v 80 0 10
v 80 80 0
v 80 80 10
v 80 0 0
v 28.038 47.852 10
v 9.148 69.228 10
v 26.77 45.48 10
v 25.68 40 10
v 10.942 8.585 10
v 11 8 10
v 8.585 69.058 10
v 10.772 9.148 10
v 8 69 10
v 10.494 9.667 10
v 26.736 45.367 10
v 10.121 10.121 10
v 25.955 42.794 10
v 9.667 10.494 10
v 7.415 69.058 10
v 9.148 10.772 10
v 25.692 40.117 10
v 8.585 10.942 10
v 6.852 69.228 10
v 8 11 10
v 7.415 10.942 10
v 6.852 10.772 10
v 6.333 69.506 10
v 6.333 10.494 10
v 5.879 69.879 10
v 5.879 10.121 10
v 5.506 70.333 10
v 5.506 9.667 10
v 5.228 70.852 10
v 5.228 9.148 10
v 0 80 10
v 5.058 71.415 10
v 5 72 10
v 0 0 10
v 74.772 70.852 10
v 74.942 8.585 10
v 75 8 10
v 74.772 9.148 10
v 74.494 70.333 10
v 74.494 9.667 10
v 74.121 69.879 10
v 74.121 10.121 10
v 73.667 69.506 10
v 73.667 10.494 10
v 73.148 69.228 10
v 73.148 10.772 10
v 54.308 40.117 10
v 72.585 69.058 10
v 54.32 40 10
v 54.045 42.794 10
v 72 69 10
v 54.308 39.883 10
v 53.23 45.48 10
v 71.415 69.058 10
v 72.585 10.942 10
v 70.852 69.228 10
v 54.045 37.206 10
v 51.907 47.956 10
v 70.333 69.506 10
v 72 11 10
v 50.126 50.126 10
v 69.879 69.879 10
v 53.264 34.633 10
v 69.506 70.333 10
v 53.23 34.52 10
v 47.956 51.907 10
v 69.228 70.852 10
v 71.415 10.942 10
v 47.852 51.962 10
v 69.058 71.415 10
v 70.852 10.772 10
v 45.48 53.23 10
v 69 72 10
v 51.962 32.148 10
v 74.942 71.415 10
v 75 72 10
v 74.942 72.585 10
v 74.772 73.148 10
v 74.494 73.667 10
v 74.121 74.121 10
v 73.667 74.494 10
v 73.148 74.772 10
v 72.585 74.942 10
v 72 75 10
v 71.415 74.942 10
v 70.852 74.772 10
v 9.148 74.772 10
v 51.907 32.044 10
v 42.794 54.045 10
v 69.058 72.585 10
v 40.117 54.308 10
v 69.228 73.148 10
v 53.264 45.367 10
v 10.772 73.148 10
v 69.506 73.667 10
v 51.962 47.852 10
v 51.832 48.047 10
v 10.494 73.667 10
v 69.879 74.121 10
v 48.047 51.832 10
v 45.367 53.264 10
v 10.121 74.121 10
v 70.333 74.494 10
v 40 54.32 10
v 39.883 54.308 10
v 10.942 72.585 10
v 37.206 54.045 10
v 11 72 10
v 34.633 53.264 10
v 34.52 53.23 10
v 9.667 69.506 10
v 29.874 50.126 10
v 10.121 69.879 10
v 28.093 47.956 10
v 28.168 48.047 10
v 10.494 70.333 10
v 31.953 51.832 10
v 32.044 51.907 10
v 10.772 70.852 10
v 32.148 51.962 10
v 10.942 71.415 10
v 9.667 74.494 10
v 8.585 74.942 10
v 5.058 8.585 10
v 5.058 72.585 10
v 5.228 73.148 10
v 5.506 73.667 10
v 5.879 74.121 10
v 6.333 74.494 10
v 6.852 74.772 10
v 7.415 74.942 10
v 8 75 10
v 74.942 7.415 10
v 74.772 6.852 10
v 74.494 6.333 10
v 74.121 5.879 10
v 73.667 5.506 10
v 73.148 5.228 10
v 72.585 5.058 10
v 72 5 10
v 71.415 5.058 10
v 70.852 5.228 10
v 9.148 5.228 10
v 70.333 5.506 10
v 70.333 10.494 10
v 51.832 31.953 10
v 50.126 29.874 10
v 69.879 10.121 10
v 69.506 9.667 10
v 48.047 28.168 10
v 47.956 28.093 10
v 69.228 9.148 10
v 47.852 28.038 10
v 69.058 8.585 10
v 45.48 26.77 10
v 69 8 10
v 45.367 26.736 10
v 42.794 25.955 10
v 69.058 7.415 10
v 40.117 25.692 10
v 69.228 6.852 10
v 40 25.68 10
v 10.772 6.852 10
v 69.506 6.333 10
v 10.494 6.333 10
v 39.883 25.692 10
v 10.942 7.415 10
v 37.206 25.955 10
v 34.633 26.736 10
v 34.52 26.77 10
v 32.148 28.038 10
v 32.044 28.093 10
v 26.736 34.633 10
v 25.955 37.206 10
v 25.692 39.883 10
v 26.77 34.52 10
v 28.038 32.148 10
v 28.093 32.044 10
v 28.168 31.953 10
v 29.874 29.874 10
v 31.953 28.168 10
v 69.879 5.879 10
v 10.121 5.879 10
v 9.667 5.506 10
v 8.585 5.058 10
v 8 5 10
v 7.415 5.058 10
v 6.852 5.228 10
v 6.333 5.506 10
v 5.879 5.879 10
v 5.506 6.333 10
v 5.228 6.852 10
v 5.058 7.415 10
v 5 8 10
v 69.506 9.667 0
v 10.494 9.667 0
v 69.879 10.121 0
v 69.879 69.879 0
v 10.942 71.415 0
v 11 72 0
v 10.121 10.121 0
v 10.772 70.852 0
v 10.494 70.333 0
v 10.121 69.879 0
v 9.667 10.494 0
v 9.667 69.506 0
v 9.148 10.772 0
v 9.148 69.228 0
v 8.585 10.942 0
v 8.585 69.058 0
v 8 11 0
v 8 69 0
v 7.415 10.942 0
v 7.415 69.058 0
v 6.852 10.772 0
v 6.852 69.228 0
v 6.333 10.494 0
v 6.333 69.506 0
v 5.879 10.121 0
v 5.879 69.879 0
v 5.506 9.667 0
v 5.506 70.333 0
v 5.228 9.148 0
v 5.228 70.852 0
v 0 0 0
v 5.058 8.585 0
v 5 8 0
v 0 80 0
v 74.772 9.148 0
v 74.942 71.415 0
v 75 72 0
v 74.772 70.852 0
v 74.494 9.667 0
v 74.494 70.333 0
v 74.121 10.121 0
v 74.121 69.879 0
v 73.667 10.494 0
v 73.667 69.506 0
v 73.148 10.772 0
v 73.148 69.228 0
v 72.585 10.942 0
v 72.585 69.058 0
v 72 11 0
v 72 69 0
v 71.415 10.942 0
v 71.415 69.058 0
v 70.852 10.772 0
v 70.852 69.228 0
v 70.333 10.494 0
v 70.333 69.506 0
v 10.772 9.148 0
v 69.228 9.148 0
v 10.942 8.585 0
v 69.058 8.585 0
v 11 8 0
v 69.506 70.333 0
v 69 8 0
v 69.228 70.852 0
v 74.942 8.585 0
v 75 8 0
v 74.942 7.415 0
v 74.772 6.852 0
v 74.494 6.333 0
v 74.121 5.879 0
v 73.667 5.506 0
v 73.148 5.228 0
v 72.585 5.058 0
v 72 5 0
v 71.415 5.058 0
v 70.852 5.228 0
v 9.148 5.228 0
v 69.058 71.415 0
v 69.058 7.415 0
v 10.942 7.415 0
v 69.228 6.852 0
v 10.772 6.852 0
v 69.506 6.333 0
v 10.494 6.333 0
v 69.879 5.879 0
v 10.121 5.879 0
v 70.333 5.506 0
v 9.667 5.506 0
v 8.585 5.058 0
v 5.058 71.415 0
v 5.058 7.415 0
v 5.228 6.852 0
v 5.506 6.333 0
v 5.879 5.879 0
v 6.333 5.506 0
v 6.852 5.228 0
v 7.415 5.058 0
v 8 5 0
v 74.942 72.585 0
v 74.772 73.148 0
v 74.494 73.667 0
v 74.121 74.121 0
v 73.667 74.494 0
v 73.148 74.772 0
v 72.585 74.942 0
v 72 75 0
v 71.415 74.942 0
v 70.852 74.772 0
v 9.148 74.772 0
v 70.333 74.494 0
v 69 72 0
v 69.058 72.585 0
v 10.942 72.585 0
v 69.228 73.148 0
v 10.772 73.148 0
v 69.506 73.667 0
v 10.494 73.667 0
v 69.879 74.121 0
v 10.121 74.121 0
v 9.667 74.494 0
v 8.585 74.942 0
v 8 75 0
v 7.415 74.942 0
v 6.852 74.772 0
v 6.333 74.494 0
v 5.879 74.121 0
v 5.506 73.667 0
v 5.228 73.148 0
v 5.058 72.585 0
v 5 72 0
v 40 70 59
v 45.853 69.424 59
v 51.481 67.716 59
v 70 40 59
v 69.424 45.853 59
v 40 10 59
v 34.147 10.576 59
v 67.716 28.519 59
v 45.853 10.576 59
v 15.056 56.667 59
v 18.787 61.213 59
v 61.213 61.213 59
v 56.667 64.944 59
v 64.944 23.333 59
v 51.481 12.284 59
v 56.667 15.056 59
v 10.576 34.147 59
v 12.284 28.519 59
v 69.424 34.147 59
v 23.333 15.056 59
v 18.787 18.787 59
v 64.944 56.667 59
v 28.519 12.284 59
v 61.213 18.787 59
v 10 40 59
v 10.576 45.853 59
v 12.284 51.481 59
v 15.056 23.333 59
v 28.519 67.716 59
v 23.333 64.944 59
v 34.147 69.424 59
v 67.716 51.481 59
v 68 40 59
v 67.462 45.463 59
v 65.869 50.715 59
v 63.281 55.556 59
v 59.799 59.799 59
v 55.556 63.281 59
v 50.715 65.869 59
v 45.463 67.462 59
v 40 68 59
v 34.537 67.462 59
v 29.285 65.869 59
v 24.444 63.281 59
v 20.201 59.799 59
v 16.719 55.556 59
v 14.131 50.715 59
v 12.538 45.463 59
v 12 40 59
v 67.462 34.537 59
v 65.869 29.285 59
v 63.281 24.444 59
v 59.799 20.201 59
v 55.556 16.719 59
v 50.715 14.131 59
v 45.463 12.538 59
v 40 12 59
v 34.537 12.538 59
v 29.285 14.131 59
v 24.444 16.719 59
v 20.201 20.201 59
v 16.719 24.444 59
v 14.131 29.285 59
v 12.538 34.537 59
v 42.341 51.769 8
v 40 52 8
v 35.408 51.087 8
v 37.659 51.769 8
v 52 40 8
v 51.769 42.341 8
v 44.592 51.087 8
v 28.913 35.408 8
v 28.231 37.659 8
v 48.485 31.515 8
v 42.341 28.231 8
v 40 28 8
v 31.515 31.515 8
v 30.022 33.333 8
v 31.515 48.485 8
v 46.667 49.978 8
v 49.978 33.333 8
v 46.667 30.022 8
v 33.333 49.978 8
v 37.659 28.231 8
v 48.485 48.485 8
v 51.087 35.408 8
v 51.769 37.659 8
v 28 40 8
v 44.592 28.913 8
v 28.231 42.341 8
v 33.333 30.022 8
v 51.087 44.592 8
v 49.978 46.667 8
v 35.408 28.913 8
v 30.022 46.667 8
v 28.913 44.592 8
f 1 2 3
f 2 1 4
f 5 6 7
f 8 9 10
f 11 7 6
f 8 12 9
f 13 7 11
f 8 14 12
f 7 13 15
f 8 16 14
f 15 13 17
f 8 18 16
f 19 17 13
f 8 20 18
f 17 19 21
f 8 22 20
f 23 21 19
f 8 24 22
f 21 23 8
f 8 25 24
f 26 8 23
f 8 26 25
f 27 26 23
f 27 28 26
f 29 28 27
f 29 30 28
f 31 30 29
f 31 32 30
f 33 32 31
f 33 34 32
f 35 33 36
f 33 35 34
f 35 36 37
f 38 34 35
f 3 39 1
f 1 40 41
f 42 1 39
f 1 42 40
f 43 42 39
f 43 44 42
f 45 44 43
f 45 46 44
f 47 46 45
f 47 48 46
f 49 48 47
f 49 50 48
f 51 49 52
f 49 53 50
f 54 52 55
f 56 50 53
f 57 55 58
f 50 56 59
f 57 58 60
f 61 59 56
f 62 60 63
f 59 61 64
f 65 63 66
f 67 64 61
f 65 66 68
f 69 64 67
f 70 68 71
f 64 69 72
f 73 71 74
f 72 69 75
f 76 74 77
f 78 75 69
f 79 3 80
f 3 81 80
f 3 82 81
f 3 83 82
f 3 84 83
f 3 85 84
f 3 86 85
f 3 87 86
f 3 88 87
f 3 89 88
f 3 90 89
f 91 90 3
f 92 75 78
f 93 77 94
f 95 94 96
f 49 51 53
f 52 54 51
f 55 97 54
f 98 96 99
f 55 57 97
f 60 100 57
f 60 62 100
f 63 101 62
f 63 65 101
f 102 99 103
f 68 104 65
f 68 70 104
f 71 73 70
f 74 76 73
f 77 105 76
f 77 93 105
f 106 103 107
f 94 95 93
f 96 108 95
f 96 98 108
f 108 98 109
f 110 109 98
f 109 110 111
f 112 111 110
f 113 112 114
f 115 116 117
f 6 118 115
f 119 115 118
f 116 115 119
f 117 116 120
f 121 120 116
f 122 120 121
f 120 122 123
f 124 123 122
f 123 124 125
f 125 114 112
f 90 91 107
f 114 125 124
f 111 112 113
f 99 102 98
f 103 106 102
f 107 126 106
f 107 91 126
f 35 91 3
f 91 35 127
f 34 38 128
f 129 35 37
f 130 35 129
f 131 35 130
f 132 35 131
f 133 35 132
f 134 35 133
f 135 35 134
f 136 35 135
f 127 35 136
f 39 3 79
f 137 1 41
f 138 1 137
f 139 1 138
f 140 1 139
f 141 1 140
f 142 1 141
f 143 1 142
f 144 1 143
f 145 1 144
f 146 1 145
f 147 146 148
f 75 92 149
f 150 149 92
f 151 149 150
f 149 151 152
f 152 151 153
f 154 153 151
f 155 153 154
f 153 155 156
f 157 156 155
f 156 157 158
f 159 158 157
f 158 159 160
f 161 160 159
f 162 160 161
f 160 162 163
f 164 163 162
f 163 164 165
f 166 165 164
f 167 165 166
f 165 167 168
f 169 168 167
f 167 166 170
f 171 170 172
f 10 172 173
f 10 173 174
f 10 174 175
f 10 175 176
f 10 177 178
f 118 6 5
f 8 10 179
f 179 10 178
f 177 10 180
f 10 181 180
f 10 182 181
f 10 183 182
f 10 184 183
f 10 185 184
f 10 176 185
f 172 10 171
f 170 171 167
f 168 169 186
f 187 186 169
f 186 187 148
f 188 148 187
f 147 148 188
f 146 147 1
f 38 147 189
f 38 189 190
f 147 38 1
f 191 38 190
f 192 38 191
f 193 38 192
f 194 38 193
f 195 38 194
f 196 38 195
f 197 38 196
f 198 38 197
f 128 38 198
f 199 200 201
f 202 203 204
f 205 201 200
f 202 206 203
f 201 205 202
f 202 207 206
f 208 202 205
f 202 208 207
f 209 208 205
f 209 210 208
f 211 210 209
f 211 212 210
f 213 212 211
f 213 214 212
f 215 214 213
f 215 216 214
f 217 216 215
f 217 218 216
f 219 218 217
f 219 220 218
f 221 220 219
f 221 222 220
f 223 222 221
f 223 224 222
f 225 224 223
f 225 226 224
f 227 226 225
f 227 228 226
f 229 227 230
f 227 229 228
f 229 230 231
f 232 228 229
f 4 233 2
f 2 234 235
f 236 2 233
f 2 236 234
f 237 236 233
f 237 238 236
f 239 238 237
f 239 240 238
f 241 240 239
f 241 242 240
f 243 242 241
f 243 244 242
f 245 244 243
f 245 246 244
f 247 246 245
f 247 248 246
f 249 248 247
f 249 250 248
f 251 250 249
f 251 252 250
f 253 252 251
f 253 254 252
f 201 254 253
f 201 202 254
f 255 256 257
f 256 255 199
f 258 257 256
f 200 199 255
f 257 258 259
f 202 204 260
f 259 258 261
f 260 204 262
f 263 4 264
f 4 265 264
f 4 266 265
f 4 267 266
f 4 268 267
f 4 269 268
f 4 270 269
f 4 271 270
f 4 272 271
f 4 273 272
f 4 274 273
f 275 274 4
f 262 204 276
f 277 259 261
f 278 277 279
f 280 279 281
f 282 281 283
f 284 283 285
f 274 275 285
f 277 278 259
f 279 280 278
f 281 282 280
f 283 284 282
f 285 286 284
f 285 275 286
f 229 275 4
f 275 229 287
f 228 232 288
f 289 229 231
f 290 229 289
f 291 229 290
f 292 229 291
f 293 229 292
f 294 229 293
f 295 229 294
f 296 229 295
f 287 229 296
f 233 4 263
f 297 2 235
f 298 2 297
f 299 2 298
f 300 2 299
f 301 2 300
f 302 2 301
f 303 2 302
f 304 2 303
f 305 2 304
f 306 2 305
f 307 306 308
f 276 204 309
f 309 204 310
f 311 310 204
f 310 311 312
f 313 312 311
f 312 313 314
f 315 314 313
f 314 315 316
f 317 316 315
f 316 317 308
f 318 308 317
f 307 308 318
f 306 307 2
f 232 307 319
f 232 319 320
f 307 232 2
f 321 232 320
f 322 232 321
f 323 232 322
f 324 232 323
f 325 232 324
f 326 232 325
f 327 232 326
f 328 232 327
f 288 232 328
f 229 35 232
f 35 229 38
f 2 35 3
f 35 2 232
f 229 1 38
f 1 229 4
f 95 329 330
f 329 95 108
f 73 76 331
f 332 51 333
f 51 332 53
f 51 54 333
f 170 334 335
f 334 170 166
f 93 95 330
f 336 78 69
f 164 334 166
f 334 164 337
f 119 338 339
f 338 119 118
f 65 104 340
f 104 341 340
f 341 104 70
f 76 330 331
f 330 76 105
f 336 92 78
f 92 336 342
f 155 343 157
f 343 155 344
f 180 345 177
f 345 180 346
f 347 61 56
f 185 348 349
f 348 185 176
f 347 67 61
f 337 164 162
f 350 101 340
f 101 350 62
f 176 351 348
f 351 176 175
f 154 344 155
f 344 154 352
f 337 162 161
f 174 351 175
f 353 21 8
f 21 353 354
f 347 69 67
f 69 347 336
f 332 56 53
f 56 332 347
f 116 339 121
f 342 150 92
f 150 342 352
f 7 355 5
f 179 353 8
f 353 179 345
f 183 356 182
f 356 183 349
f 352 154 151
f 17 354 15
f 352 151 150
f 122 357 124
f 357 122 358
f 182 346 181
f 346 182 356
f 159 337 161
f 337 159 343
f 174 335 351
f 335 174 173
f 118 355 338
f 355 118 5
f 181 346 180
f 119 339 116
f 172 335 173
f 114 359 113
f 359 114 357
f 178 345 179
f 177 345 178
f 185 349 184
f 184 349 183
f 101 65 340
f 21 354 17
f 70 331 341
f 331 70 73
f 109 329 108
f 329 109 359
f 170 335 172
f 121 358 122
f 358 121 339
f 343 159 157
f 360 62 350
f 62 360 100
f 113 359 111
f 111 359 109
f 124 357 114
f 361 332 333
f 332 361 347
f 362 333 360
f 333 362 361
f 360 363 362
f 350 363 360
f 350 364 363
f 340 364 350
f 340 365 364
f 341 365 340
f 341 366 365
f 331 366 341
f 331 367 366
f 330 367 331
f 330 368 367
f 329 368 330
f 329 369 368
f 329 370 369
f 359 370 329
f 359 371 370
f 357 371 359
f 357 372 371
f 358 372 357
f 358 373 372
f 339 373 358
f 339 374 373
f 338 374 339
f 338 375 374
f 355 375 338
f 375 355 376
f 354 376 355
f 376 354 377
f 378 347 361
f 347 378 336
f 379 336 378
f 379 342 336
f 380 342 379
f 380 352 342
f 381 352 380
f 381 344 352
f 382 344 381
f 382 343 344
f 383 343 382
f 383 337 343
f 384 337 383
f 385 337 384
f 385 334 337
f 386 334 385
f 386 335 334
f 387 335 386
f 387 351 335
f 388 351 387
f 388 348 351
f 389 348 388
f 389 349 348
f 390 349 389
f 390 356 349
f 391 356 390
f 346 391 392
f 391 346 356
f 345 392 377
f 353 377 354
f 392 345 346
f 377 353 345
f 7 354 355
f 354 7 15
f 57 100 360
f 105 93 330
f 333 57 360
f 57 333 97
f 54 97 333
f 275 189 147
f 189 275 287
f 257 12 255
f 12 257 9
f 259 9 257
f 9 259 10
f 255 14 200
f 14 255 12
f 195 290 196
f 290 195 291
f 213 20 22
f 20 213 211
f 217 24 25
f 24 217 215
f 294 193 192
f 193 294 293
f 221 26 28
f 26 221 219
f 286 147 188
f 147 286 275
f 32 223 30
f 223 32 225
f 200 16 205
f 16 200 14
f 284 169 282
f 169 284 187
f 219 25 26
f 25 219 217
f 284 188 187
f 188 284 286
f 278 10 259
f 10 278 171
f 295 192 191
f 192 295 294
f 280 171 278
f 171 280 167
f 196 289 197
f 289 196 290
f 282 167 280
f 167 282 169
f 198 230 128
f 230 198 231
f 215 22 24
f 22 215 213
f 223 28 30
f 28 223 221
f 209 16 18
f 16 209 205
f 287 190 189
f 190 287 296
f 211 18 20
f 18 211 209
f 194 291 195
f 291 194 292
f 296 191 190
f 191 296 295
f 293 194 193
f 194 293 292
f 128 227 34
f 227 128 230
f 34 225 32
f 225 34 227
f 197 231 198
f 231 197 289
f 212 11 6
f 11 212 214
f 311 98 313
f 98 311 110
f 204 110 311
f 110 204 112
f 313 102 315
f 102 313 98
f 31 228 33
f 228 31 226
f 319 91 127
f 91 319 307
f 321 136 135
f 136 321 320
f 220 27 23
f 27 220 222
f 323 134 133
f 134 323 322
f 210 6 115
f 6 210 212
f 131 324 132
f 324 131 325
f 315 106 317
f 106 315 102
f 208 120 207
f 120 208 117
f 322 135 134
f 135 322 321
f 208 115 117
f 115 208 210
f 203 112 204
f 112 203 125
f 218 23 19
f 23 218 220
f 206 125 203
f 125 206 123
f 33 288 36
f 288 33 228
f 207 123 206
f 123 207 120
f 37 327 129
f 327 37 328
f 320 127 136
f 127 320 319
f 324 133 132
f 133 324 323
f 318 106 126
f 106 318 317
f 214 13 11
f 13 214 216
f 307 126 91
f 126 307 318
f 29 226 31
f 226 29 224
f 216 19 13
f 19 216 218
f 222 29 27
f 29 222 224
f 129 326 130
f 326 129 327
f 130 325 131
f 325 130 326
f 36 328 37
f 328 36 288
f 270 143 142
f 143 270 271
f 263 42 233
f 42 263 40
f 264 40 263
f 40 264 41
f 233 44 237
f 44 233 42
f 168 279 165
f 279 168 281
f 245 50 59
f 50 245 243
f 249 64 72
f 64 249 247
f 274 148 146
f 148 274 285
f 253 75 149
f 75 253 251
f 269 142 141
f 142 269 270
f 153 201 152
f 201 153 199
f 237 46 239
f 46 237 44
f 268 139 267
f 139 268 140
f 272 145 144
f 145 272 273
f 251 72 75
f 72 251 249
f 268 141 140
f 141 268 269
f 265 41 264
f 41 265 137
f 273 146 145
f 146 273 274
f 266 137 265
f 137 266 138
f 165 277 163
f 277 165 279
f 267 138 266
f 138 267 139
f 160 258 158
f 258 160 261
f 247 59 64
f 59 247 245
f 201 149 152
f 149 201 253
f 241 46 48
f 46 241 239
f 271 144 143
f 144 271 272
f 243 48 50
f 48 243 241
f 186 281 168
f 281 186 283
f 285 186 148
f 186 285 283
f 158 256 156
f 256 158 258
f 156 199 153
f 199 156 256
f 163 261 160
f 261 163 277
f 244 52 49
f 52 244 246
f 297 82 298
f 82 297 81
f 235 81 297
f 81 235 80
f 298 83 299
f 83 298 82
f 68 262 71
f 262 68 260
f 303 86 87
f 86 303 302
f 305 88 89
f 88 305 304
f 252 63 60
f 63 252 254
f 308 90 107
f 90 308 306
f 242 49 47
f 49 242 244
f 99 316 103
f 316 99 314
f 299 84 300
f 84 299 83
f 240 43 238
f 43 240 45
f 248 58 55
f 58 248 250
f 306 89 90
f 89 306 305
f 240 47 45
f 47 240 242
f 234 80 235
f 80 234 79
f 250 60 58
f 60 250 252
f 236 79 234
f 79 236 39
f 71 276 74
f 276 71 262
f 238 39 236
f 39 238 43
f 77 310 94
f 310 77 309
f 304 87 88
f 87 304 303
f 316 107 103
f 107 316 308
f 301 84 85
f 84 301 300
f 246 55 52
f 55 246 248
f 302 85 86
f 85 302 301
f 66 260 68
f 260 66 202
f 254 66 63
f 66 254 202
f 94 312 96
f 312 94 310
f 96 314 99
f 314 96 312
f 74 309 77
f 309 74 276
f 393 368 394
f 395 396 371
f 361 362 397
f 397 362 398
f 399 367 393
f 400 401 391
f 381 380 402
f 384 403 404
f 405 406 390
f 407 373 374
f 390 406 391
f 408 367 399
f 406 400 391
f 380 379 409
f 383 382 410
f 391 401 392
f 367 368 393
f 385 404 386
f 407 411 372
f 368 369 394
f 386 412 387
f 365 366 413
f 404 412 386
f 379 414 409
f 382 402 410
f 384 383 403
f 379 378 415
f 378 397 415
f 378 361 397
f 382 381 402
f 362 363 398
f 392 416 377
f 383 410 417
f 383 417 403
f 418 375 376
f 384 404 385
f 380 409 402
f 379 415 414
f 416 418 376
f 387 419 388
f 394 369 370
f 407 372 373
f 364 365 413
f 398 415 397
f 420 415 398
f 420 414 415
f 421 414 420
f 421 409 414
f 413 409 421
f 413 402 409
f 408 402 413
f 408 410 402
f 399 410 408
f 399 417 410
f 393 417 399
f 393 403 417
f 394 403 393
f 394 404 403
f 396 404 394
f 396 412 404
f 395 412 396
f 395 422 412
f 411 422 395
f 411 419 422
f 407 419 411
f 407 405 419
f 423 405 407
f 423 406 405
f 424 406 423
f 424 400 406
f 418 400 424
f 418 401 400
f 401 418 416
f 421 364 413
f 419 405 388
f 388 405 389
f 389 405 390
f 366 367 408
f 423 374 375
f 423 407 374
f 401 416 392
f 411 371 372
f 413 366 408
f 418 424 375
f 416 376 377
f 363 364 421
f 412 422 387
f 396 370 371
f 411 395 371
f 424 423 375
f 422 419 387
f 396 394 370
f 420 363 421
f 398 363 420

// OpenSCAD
$fn = 32;

// ----------------------------------------------------------------------
// Hopper: flanged with square flange
// ----------------------------------------------------------------------

// --- parameters (mm) ---
fl = 80;                  // flange side, X and Y
fl_t = 10;                // flange thickness
cone_h = 50;              // cone height above the flange
top_d = 60;               // cone mouth diameter
bot_d = 28;               // cone spout diameter
wall = 2;                 // cone wall thickness
hole_r = 3;               // flange hole radius
hole_in = 8;              // hole inset from the corners

bore_d = bot_d - 2 * wall;  // spout bore diameter
total_h = fl_t + cone_h - 1;  // overall height

difference() {
  union() {
    cube([fl, fl, fl_t]);
    translate([fl / 2, fl / 2, fl_t - 1])
      cylinder(h = cone_h, d1 = bot_d, d2 = top_d);
  }
  translate([fl / 2, fl / 2, fl_t - 2])
    cylinder(h = cone_h + 1, d1 = bore_d, d2 = top_d - 2 * wall);
  for (sx = [0, 1], sy = [0, 1])
    translate([sx ? fl - hole_in : hole_in,
               sy ? fl - hole_in : hole_in, -1])
      cylinder(r = hole_r, h = fl_t + 2);
}
